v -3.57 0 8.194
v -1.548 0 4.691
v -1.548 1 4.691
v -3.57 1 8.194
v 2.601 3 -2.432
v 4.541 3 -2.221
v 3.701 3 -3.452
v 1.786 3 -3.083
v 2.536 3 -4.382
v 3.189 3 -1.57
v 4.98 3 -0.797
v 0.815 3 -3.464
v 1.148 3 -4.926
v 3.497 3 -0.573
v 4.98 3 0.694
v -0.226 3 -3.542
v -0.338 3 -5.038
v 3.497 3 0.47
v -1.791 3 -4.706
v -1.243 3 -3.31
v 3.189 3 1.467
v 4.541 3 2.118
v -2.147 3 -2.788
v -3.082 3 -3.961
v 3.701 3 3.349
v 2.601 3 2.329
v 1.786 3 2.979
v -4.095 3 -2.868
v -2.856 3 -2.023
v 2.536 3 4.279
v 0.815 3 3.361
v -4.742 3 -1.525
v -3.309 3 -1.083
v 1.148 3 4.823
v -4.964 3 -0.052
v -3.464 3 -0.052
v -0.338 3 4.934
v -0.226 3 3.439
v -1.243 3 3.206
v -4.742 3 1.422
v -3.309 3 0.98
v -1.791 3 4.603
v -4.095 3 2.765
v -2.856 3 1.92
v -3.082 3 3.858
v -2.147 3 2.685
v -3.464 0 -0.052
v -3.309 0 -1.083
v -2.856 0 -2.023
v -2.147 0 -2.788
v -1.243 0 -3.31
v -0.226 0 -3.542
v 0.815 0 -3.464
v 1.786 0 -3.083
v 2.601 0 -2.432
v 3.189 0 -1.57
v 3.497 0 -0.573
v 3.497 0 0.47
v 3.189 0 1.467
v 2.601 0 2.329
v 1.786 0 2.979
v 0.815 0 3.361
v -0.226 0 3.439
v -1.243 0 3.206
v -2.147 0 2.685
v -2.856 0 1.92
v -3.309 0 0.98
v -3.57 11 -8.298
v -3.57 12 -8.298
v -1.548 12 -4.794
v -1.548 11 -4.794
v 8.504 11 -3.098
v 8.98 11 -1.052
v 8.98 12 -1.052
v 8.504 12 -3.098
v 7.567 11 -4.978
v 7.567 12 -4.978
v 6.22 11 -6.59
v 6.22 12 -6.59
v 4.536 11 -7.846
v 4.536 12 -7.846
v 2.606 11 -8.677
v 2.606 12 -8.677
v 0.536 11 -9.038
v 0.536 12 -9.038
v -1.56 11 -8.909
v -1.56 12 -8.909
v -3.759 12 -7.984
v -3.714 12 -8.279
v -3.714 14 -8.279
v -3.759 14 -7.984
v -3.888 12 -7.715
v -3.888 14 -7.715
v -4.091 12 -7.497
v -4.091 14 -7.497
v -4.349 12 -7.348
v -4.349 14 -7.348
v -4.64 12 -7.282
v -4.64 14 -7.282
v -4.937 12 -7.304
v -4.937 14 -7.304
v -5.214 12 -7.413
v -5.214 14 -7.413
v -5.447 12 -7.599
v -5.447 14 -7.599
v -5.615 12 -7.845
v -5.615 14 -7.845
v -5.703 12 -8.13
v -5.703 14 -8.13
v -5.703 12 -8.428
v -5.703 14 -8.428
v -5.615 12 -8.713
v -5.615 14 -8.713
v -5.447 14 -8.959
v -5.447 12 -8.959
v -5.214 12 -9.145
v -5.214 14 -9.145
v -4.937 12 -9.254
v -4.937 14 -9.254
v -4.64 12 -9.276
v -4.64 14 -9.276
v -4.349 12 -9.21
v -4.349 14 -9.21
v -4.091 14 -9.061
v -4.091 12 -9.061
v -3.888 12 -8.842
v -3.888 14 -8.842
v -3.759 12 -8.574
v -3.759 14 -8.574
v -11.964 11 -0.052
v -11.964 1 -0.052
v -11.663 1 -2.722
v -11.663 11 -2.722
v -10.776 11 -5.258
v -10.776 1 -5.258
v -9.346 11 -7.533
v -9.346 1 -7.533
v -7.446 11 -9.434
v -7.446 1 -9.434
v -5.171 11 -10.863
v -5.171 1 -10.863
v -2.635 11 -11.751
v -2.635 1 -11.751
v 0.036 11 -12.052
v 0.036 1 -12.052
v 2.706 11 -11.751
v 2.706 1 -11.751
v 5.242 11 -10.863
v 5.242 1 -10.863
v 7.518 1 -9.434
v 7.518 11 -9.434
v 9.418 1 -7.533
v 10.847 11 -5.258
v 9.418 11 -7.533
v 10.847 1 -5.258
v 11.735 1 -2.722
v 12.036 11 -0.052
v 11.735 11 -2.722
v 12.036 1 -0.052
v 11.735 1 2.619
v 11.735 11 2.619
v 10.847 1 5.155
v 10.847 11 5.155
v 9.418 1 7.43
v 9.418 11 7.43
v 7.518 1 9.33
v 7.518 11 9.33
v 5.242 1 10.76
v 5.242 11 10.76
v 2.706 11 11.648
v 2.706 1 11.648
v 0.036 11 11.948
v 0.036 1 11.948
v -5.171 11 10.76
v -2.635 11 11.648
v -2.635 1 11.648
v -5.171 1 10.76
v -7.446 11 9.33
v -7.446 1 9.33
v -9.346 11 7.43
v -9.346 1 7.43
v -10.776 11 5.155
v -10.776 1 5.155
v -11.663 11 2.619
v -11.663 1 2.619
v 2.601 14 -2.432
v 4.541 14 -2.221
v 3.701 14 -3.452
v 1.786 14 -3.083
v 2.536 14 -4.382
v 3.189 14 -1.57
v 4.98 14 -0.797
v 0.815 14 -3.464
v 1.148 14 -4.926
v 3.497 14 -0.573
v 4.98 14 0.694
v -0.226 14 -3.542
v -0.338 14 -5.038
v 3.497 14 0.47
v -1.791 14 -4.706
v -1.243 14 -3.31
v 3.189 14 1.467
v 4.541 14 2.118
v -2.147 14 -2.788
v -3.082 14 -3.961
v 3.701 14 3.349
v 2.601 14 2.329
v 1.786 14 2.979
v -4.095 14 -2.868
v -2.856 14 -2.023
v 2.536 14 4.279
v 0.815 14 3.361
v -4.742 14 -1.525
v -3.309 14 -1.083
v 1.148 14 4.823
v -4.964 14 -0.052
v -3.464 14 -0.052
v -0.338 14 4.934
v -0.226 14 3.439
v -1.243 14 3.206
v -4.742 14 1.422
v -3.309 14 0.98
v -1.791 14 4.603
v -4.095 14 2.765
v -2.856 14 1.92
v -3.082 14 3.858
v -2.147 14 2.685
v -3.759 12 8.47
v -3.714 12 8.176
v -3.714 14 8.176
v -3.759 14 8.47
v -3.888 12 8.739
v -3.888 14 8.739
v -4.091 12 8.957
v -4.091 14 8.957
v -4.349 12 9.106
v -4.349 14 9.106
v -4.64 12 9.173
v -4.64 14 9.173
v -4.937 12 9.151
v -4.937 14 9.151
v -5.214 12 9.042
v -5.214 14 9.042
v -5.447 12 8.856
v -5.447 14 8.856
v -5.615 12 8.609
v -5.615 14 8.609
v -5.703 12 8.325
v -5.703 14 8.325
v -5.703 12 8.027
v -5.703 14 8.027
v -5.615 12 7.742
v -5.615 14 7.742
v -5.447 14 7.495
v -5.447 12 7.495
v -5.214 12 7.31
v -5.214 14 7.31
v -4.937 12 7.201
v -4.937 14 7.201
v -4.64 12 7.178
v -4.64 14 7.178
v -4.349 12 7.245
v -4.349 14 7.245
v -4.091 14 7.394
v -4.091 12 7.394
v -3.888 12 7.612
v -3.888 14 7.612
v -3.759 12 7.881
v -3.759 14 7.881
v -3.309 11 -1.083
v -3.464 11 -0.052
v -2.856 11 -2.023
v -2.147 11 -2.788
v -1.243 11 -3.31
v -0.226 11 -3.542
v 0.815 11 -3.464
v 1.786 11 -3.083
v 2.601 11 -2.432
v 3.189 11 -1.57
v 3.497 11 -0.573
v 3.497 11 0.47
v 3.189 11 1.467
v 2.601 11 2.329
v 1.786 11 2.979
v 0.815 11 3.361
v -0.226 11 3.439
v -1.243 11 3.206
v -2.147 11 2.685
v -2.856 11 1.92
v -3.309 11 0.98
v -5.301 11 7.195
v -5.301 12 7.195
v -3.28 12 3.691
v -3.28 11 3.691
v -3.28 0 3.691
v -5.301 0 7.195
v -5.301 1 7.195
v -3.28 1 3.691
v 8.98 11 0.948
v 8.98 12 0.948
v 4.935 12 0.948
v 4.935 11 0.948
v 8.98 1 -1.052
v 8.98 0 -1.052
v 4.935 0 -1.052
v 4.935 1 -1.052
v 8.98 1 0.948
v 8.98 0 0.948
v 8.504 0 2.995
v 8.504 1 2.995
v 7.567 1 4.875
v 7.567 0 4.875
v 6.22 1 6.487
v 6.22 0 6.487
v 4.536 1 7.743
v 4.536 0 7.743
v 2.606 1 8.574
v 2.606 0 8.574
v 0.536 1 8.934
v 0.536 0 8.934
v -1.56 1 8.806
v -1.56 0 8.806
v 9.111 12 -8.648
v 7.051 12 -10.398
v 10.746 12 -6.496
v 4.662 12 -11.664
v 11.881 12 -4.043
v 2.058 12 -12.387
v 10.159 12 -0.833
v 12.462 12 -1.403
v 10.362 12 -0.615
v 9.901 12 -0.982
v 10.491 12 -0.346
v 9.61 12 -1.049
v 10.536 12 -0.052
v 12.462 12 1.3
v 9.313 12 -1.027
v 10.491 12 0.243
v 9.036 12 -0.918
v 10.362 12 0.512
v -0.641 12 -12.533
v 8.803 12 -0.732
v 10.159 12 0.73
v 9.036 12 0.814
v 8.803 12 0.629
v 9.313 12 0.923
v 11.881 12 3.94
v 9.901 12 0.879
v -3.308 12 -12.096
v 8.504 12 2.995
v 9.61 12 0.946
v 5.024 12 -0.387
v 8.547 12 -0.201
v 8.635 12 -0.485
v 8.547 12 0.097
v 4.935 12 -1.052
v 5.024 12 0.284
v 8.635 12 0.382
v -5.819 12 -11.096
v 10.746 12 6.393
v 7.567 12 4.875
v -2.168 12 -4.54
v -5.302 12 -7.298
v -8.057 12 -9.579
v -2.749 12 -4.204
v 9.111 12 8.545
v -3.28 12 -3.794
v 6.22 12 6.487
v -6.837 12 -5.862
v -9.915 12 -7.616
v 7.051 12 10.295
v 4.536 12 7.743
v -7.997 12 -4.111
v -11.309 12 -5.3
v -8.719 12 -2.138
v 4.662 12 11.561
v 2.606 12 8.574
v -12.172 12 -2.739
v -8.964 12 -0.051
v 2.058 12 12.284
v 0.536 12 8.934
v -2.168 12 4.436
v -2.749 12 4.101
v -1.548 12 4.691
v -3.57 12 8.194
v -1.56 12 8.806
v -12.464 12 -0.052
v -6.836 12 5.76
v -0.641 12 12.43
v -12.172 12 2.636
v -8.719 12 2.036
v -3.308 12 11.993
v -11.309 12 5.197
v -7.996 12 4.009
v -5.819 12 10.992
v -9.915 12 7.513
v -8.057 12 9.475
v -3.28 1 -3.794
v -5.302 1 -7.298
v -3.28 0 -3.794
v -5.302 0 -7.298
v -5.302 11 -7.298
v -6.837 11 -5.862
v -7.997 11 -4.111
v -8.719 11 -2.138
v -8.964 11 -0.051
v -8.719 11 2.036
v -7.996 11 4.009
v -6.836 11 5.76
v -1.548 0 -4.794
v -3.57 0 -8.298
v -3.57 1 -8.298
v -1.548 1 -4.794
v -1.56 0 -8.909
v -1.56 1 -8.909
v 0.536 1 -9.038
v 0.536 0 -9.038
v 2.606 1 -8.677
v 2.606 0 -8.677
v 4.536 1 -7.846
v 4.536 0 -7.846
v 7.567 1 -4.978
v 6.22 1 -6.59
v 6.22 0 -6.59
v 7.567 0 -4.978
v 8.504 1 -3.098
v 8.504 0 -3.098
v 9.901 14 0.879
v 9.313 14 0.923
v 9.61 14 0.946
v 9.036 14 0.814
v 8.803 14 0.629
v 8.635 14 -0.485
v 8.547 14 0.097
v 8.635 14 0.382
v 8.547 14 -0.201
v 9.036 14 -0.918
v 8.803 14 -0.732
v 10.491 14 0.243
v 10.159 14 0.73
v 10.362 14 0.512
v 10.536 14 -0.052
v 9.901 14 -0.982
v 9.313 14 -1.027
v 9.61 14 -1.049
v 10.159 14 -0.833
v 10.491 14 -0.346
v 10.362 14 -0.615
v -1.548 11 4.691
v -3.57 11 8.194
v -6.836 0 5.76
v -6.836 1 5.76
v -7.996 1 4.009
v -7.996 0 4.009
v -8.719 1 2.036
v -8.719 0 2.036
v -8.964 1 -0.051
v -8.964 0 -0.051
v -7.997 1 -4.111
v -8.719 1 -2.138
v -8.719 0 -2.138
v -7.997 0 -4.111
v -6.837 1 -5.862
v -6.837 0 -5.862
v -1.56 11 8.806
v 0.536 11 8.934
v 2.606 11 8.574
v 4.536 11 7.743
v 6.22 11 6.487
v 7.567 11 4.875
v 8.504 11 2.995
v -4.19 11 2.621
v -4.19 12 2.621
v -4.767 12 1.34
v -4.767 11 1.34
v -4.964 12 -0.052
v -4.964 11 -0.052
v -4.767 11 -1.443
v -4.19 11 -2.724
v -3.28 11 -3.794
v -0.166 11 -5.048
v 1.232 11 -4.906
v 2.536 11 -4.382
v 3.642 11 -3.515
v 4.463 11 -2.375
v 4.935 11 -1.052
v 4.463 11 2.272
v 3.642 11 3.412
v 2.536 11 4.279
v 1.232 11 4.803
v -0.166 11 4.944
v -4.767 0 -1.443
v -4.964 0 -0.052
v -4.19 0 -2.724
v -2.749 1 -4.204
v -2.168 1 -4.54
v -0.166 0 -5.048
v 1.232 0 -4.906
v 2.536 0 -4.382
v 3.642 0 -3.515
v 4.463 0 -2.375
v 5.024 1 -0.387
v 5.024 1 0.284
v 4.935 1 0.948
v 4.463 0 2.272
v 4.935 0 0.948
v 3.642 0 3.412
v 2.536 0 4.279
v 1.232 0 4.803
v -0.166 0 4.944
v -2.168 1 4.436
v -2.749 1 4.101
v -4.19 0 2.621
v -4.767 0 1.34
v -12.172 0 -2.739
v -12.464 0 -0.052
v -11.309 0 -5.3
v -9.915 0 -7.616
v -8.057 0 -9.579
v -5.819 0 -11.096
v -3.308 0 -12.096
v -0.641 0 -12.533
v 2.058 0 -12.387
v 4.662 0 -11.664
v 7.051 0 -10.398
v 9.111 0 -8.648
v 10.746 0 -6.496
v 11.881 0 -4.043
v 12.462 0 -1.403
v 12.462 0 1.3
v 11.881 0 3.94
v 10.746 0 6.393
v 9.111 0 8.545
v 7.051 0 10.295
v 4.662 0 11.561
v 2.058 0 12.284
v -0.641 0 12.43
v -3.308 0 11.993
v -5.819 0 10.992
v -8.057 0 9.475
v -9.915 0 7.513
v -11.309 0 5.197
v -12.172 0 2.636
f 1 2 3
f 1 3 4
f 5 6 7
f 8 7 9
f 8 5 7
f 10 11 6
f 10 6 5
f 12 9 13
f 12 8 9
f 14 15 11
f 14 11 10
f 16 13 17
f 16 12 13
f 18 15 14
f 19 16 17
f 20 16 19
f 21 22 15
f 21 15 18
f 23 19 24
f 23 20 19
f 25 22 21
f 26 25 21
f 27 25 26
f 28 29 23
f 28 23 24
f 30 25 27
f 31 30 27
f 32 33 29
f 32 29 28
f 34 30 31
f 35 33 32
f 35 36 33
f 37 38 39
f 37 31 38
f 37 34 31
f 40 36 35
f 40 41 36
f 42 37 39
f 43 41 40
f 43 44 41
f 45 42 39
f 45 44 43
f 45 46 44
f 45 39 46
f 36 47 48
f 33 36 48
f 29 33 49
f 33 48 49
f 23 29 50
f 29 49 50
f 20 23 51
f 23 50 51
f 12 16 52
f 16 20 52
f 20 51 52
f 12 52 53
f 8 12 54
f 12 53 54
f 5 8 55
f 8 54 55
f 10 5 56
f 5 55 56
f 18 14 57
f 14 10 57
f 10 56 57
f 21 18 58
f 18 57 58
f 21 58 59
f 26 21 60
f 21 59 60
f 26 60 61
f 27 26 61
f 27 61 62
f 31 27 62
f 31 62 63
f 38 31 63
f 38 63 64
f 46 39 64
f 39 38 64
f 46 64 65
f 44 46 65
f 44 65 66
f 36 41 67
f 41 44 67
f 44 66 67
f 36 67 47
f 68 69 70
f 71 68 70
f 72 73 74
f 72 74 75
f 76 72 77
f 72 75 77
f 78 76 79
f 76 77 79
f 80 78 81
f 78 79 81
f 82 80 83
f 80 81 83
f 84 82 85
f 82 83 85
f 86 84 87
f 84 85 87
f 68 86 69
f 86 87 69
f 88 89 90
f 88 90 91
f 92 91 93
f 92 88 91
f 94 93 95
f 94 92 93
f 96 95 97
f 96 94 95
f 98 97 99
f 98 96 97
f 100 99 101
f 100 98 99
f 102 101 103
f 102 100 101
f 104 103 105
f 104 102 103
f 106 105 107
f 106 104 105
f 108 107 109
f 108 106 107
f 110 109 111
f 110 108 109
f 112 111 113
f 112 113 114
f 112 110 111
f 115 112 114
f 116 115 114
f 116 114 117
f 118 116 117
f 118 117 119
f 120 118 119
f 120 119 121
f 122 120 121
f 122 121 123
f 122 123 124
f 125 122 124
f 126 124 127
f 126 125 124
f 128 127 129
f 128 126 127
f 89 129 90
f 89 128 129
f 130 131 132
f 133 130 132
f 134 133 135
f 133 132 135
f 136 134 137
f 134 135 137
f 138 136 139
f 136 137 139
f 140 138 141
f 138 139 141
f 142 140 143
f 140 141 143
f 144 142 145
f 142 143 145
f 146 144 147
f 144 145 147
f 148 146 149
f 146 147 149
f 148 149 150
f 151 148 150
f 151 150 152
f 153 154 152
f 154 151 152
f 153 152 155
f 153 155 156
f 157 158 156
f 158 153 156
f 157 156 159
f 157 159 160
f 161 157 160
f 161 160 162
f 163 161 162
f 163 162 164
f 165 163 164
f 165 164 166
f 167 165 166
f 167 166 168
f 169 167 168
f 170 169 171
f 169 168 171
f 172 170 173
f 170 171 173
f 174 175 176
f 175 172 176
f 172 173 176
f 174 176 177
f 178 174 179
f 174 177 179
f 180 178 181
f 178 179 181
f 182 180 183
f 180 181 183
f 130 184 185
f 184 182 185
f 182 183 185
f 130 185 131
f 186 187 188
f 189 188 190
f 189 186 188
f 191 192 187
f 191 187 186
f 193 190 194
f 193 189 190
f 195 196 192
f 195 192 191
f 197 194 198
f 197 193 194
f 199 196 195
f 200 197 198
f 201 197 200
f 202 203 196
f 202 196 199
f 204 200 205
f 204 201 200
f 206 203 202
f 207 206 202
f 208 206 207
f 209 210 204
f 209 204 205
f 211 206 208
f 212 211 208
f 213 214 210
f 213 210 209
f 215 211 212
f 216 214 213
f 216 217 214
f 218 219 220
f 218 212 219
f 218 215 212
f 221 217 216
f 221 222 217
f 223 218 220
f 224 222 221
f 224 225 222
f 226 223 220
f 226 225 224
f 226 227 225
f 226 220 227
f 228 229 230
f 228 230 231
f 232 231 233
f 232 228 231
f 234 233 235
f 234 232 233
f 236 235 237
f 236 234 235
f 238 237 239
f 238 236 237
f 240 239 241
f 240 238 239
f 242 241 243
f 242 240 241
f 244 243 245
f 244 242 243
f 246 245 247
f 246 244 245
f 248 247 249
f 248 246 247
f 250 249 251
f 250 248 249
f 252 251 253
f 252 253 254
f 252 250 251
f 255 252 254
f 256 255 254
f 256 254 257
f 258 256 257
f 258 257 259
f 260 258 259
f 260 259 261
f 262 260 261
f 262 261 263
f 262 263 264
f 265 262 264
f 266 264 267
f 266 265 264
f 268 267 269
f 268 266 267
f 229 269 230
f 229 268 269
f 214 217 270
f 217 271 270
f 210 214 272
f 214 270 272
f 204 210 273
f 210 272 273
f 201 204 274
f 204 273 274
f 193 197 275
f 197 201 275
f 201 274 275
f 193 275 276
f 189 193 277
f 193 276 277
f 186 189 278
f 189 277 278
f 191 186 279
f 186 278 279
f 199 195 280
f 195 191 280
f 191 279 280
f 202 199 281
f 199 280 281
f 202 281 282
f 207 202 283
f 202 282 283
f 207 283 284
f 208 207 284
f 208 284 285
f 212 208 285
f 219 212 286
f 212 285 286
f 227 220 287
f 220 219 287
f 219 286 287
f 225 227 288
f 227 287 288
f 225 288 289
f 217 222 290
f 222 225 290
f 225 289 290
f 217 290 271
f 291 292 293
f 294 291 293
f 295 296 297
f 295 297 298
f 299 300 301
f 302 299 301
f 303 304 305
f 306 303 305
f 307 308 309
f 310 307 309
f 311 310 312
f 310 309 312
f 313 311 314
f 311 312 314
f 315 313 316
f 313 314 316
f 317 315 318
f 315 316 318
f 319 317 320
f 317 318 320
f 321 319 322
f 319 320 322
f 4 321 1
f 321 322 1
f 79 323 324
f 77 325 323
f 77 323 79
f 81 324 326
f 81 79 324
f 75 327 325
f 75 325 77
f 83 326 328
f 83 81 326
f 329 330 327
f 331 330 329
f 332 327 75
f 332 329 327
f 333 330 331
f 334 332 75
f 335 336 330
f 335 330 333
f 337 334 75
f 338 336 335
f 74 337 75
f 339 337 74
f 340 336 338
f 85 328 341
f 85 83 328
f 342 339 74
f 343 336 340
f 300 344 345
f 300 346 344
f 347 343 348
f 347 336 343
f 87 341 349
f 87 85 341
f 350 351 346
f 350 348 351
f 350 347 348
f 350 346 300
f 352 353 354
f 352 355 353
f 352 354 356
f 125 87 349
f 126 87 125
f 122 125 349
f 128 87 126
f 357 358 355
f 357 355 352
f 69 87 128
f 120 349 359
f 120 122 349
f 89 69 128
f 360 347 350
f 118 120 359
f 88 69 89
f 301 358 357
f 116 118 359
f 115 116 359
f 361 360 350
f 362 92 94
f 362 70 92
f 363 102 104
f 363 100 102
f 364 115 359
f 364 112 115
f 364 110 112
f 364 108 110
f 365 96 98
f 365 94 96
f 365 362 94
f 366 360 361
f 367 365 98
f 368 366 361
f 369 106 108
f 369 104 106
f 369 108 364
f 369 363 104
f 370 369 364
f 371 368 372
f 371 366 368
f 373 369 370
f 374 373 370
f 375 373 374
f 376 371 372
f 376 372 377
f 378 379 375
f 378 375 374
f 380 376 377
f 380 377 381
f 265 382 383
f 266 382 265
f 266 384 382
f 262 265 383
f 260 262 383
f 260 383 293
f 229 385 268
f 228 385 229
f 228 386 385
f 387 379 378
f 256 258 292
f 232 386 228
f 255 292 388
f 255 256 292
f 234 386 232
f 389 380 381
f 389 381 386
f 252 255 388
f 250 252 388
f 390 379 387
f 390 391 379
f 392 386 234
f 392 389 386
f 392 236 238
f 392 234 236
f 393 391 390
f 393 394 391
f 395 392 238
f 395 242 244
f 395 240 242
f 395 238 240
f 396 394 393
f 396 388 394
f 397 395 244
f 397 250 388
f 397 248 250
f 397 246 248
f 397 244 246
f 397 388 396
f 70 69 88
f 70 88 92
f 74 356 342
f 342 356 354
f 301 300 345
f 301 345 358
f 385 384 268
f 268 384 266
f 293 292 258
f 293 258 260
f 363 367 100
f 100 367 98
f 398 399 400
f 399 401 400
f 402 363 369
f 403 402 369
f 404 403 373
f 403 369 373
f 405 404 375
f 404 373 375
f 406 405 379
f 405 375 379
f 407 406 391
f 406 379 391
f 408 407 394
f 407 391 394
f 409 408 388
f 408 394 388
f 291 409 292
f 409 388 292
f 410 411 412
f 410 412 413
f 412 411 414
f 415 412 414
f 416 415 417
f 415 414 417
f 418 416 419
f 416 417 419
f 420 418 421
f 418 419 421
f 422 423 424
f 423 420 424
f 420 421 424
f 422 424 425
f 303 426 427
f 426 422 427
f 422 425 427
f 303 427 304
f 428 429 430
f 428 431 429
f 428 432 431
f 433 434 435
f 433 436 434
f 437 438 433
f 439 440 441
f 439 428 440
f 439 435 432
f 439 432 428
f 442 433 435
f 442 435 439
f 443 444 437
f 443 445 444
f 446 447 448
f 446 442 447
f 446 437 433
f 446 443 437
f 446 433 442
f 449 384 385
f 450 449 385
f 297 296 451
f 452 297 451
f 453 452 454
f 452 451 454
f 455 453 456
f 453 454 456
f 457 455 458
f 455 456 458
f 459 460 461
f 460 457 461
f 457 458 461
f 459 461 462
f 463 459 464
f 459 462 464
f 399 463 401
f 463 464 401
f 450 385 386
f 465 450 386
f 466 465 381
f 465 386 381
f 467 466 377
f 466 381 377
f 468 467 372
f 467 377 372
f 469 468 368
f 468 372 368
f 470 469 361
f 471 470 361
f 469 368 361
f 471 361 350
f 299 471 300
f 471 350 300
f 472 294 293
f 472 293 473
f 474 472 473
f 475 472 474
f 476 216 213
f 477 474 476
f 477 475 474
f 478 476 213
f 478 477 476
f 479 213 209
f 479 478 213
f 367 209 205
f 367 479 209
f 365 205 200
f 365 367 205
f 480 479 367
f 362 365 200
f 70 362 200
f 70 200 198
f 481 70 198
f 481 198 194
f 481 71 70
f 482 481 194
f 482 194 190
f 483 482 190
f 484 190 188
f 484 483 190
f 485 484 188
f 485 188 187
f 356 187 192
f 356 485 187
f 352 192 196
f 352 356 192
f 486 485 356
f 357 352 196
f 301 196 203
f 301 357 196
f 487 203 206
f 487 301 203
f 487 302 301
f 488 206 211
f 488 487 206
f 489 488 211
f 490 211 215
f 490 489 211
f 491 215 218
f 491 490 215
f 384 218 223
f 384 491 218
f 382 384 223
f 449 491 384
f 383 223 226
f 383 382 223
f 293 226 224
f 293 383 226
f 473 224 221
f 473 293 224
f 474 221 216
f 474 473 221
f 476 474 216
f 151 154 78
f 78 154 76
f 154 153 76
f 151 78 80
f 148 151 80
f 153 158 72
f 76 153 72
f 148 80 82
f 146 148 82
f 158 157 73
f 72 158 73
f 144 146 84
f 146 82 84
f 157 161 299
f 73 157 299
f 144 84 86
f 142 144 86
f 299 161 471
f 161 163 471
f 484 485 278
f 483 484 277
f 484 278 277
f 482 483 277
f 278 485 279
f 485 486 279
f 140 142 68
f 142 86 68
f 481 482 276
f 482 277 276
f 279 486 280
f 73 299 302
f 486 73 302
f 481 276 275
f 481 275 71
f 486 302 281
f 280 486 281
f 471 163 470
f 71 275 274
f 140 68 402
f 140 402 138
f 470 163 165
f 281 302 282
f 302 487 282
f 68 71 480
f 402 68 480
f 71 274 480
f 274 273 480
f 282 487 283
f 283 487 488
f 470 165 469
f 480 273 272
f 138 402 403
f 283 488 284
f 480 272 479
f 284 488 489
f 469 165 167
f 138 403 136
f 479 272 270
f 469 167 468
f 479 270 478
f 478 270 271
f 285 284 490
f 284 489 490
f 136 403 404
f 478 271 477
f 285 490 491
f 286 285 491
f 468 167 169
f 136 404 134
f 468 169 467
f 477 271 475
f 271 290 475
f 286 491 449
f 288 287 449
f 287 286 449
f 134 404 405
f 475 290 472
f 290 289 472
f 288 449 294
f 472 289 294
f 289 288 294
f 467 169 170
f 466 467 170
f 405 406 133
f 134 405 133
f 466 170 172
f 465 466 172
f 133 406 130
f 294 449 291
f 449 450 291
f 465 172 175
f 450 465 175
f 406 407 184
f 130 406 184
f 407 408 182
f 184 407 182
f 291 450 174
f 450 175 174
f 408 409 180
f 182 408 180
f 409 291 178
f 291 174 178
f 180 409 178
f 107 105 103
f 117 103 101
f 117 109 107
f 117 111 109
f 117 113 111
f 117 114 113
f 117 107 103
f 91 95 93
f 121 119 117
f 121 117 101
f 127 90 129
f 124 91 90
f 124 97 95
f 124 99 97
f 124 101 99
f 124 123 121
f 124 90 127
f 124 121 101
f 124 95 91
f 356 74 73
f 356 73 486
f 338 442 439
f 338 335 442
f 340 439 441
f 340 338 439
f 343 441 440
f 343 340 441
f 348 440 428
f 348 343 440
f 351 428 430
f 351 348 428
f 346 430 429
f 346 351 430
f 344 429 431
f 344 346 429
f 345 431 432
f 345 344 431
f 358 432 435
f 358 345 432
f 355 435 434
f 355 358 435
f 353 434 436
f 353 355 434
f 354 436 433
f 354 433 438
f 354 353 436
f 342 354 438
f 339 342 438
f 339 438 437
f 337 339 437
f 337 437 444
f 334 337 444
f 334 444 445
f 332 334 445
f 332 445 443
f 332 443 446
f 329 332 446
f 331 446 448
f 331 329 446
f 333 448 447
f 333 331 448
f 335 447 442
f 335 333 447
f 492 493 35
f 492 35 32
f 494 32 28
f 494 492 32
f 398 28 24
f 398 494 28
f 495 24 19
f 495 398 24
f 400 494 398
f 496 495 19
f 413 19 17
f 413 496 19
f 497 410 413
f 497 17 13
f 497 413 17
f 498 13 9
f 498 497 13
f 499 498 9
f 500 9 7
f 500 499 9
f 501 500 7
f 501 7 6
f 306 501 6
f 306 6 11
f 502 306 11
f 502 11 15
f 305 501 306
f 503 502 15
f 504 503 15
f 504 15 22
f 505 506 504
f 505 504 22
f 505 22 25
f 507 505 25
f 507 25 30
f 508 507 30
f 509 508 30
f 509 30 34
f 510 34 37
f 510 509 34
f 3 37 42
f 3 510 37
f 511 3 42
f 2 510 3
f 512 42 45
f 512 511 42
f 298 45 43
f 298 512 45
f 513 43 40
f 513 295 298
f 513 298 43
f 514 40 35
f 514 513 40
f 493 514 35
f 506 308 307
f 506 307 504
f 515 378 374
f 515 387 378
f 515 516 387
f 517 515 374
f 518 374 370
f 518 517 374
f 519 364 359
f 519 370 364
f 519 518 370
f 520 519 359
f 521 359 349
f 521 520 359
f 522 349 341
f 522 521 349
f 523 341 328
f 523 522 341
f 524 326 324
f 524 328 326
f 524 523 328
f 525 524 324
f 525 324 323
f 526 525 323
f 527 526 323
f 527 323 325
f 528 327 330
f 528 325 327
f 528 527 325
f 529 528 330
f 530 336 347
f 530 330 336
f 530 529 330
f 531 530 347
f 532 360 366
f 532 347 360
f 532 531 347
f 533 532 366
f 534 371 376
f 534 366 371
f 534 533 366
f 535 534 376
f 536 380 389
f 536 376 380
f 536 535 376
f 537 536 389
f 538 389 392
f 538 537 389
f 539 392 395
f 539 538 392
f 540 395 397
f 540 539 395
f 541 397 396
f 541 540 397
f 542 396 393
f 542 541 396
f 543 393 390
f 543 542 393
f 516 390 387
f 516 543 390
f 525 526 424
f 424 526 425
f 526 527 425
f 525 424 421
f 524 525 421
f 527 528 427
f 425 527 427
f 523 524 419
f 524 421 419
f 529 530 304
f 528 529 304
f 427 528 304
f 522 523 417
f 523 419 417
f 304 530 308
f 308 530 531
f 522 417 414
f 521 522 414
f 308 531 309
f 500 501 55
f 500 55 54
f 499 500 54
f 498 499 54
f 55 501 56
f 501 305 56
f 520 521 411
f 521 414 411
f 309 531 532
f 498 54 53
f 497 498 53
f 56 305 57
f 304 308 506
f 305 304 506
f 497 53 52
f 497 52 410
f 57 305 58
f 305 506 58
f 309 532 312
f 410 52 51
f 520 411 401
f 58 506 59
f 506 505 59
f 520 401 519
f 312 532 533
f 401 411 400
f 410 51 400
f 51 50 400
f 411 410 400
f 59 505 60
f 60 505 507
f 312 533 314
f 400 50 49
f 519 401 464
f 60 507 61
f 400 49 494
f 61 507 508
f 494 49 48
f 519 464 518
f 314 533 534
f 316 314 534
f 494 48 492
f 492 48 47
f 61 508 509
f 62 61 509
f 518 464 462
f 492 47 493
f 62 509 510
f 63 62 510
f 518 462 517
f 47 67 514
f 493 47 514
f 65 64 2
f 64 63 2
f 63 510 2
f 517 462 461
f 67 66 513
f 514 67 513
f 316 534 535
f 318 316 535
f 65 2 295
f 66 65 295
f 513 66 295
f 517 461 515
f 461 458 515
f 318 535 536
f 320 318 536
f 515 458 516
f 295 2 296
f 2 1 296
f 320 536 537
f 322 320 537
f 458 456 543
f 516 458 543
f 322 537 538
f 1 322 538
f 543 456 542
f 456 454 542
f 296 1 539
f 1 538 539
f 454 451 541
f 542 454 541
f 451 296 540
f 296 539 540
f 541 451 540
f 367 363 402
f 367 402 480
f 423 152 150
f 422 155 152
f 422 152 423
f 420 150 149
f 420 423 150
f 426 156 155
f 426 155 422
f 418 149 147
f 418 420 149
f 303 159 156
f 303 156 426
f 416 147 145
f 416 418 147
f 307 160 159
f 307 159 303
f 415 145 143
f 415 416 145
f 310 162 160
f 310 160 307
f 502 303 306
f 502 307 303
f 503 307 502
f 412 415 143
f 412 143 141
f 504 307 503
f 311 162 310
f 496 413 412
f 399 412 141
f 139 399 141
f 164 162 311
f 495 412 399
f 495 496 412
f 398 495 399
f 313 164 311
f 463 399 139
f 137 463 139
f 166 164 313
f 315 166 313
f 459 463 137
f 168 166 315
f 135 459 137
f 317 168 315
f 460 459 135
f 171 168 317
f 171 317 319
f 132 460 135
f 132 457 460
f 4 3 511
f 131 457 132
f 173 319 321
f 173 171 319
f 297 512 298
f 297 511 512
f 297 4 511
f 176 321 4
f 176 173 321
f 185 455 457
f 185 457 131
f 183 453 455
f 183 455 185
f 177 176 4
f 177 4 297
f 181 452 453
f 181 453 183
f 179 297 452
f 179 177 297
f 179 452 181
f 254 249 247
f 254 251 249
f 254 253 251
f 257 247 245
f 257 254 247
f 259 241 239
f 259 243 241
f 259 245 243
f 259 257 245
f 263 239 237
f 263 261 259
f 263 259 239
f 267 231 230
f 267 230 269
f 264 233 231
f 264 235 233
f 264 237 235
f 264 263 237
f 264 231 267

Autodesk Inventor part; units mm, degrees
ref_plane "YZ Plane" through (0, 0, 0) normal (1, 0, 0) x (0, 1, 0)
ref_plane "XZ Plane" through (0, 0, 0) normal (0, 1, 0) x (-1, 0, 0)
ref_plane "XY Plane" through (0, 0, 0) normal (0, 0, 1) x (1, 0, 0)
sketch "スケッチ1" plane through (0, 0, 0) normal (0, 1, 0) x (-1, 0, 0)
  circle A0 centre (-0.0357, -0.0516) radius 12.5
  circle A1 centre (-0.0357, -0.0516) radius 5
  circle A2 centre (-0.0357, -0.0516) radius 3.5
  circle A3 centre (-0.0357, -0.0516) radius 9
  arc A4 (-9.0357, -0.0516) -> (4.4643, -7.8458) centre (-0.0357, -0.0516) ccw
  line L0 (-0.0357, -0.0516) -> (4.4643, -7.8458) construction
  line L1 (-0.0357, -0.0516) -> (-9.0357, -0.0516) construction
  arc A5 (4.4643, 7.7426) -> (-9.0357, -0.0516) centre (-0.0357, -0.0516) ccw
  line L2 (-0.0357, -0.0516) -> (4.4643, 7.7426) construction
  line L3 (-0.0357, -0.0516) -> (-9.0357, -0.0516) construction
  line L4 (-9.0357, -0.0516) -> (-9.0357, 0.9484)
  line L5 (-9.0357, -0.0516) -> (-8.0357, -0.0516) construction
  line L6 (-9.0357, 0.9484) -> (-4.9347, 0.9484)
  line L7 (-9.0357, -0.0516) -> (-9.0357, -1.0516)
  line L8 (-9.0357, -0.0516) -> (-8.0357, -0.0516) construction
  line L9 (-9.0357, -1.0516) -> (-4.9347, -1.0516)
  line L10 (4.4643, 7.7426) -> (3.5983, 8.2426)
  line L11 (4.4643, 7.7426) -> (5.4643, 7.7426) construction
  line L12 (1.5477, 4.691) -> (3.5983, 8.2426)
  line L13 (4.4643, 7.7426) -> (5.3012, 7.1953)
  line L14 (5.3012, 7.1953) -> (3.2798, 3.691)
  line L15 (4.4643, -7.8458) -> (3.5983, -8.3458)
  line L16 (4.4643, -7.8458) -> (5.4643, -7.8458) construction
  line L17 (3.5983, -8.3458) -> (1.5477, -4.7942)
  line L18 (4.4643, -7.8458) -> (5.3303, -7.3458)
  line L19 (4.4643, -7.8458) -> (5.4643, -7.8458) construction
  line L20 (5.3303, -7.3458) -> (3.2798, -3.7942)
  circle A6 centre (-0.0357, -0.0516) radius 12
  point P0 (0, 0)
  point P1 (-9.0357, -0.0516)
  point P2 (3.5704, -8.2976)
  point P3 (-8.98, -1.0516)
  point P4 (-8.98, 0.9484)
  point P5 (3.5704, 8.1944)
  point P6 (5.3024, -7.2976)
  dimension "d1" = 25
  dimension "d2" = 10
  dimension "d3" = 7
  dimension "d4" = 18
  dimension "d5" = 120
  dimension "d6" = 120
  dimension "d7" = 1
  dimension "d8" = 90
  dimension "d9" = 1
  dimension "d10" = 90
  dimension "d11" = 1
  dimension "d12" = 150
  dimension "d13" = 1
  dimension "d14" = 1
  dimension "d15" = 150
  dimension "d16" = 1
  dimension "d17" = 30
  dimension "d18" = 24
extrude "押し出し1" add sketch "スケッチ1" along normal blind 12 contours A0
extrude "押し出し2" add sketch "スケッチ1" along normal blind 1 contours A1 L12 A3 L13 L14 | L20 A3 L17 A1 | L13 A3 | L20 L18 A3 | A1 L9 A3 L6 | L12 L10 A3 | A3 L15 L17 | A3 L4 L6 | L9 L7 A3 | A6
extrude "押し出し3" add sketch "スケッチ1" along normal blind 3 contours A1
extrude "押し出し4" add sketch "スケッチ1" against normal blind 1 from surface at 12 contours A1 | A1 L12 A3 L13 L14 | L20 A3 L17 A1 | L13 A3 | L20 L18 A3 | A1 L9 A3 L6 | L12 L10 A3 | A3 L15 L17 | A3 L4 L6 | L9 L7 A3 | A6
extrude "押し出し5" add sketch "スケッチ1" along normal blind 2 from surface at 12 contours A1
sketch "スケッチ2" plane through (0.0357, 12, -0.0516) normal (0, 1, 0) x (1, 0, 0)
  circle A0 centre (0, 0) radius 9.5
  arc A1 (-4.75, -8.2272) -> (9.5, 0) centre (0, 0) ccw
  line L0 (0, 0) -> (-4.75, -8.2272) construction
  line L1 (0, 0) -> (9.5, 0) construction
  arc A2 (9.5, 0) -> (-4.75, 8.2272) centre (0, 0) ccw
  line L2 (0, 0) -> (-4.75, 8.2272) construction
  line L3 (0, 0) -> (9.5, 0) construction
  circle A3 centre (9.5, 0) radius 1
  circle A4 centre (-4.75, -8.2272) radius 1
  circle A5 centre (-4.75, 8.2272) radius 1
  point P0 (-0.0357, -0.0516)
  dimension "d29" = 19
  dimension "d30" = 120
  dimension "d31" = 120
  dimension "d32" = 2
  dimension "d33" = 2
  dimension "d34" = 2
extrude "押し出し6" add sketch "スケッチ2" along normal blind 2 contours A0 A3 | A0 A3 | A5 A0 | A0 A5 | A4 A0 | A0 A4
equation "\"BendRadius\" = Thickness"
equation "\"BendReliefWidth\" = Thickness"
equation "\"BendReliefDepth\" = 0.5 * Thickness"
equation "\"CornerReliefSize\" = 4 * Thickness"
equation "\"MinimumRemnant\" = 2 * Thickness"
equation "\"TransitionRadius\" = BendRadius"
equation "\"JacobiRadiusSize\" = BendRadius"
equation "\"GapSize\" = Thickness"
equation "\"Thickness\" = 0.5"
properties part number "RobTrace_Wheel" material "ABS プラスチック"
